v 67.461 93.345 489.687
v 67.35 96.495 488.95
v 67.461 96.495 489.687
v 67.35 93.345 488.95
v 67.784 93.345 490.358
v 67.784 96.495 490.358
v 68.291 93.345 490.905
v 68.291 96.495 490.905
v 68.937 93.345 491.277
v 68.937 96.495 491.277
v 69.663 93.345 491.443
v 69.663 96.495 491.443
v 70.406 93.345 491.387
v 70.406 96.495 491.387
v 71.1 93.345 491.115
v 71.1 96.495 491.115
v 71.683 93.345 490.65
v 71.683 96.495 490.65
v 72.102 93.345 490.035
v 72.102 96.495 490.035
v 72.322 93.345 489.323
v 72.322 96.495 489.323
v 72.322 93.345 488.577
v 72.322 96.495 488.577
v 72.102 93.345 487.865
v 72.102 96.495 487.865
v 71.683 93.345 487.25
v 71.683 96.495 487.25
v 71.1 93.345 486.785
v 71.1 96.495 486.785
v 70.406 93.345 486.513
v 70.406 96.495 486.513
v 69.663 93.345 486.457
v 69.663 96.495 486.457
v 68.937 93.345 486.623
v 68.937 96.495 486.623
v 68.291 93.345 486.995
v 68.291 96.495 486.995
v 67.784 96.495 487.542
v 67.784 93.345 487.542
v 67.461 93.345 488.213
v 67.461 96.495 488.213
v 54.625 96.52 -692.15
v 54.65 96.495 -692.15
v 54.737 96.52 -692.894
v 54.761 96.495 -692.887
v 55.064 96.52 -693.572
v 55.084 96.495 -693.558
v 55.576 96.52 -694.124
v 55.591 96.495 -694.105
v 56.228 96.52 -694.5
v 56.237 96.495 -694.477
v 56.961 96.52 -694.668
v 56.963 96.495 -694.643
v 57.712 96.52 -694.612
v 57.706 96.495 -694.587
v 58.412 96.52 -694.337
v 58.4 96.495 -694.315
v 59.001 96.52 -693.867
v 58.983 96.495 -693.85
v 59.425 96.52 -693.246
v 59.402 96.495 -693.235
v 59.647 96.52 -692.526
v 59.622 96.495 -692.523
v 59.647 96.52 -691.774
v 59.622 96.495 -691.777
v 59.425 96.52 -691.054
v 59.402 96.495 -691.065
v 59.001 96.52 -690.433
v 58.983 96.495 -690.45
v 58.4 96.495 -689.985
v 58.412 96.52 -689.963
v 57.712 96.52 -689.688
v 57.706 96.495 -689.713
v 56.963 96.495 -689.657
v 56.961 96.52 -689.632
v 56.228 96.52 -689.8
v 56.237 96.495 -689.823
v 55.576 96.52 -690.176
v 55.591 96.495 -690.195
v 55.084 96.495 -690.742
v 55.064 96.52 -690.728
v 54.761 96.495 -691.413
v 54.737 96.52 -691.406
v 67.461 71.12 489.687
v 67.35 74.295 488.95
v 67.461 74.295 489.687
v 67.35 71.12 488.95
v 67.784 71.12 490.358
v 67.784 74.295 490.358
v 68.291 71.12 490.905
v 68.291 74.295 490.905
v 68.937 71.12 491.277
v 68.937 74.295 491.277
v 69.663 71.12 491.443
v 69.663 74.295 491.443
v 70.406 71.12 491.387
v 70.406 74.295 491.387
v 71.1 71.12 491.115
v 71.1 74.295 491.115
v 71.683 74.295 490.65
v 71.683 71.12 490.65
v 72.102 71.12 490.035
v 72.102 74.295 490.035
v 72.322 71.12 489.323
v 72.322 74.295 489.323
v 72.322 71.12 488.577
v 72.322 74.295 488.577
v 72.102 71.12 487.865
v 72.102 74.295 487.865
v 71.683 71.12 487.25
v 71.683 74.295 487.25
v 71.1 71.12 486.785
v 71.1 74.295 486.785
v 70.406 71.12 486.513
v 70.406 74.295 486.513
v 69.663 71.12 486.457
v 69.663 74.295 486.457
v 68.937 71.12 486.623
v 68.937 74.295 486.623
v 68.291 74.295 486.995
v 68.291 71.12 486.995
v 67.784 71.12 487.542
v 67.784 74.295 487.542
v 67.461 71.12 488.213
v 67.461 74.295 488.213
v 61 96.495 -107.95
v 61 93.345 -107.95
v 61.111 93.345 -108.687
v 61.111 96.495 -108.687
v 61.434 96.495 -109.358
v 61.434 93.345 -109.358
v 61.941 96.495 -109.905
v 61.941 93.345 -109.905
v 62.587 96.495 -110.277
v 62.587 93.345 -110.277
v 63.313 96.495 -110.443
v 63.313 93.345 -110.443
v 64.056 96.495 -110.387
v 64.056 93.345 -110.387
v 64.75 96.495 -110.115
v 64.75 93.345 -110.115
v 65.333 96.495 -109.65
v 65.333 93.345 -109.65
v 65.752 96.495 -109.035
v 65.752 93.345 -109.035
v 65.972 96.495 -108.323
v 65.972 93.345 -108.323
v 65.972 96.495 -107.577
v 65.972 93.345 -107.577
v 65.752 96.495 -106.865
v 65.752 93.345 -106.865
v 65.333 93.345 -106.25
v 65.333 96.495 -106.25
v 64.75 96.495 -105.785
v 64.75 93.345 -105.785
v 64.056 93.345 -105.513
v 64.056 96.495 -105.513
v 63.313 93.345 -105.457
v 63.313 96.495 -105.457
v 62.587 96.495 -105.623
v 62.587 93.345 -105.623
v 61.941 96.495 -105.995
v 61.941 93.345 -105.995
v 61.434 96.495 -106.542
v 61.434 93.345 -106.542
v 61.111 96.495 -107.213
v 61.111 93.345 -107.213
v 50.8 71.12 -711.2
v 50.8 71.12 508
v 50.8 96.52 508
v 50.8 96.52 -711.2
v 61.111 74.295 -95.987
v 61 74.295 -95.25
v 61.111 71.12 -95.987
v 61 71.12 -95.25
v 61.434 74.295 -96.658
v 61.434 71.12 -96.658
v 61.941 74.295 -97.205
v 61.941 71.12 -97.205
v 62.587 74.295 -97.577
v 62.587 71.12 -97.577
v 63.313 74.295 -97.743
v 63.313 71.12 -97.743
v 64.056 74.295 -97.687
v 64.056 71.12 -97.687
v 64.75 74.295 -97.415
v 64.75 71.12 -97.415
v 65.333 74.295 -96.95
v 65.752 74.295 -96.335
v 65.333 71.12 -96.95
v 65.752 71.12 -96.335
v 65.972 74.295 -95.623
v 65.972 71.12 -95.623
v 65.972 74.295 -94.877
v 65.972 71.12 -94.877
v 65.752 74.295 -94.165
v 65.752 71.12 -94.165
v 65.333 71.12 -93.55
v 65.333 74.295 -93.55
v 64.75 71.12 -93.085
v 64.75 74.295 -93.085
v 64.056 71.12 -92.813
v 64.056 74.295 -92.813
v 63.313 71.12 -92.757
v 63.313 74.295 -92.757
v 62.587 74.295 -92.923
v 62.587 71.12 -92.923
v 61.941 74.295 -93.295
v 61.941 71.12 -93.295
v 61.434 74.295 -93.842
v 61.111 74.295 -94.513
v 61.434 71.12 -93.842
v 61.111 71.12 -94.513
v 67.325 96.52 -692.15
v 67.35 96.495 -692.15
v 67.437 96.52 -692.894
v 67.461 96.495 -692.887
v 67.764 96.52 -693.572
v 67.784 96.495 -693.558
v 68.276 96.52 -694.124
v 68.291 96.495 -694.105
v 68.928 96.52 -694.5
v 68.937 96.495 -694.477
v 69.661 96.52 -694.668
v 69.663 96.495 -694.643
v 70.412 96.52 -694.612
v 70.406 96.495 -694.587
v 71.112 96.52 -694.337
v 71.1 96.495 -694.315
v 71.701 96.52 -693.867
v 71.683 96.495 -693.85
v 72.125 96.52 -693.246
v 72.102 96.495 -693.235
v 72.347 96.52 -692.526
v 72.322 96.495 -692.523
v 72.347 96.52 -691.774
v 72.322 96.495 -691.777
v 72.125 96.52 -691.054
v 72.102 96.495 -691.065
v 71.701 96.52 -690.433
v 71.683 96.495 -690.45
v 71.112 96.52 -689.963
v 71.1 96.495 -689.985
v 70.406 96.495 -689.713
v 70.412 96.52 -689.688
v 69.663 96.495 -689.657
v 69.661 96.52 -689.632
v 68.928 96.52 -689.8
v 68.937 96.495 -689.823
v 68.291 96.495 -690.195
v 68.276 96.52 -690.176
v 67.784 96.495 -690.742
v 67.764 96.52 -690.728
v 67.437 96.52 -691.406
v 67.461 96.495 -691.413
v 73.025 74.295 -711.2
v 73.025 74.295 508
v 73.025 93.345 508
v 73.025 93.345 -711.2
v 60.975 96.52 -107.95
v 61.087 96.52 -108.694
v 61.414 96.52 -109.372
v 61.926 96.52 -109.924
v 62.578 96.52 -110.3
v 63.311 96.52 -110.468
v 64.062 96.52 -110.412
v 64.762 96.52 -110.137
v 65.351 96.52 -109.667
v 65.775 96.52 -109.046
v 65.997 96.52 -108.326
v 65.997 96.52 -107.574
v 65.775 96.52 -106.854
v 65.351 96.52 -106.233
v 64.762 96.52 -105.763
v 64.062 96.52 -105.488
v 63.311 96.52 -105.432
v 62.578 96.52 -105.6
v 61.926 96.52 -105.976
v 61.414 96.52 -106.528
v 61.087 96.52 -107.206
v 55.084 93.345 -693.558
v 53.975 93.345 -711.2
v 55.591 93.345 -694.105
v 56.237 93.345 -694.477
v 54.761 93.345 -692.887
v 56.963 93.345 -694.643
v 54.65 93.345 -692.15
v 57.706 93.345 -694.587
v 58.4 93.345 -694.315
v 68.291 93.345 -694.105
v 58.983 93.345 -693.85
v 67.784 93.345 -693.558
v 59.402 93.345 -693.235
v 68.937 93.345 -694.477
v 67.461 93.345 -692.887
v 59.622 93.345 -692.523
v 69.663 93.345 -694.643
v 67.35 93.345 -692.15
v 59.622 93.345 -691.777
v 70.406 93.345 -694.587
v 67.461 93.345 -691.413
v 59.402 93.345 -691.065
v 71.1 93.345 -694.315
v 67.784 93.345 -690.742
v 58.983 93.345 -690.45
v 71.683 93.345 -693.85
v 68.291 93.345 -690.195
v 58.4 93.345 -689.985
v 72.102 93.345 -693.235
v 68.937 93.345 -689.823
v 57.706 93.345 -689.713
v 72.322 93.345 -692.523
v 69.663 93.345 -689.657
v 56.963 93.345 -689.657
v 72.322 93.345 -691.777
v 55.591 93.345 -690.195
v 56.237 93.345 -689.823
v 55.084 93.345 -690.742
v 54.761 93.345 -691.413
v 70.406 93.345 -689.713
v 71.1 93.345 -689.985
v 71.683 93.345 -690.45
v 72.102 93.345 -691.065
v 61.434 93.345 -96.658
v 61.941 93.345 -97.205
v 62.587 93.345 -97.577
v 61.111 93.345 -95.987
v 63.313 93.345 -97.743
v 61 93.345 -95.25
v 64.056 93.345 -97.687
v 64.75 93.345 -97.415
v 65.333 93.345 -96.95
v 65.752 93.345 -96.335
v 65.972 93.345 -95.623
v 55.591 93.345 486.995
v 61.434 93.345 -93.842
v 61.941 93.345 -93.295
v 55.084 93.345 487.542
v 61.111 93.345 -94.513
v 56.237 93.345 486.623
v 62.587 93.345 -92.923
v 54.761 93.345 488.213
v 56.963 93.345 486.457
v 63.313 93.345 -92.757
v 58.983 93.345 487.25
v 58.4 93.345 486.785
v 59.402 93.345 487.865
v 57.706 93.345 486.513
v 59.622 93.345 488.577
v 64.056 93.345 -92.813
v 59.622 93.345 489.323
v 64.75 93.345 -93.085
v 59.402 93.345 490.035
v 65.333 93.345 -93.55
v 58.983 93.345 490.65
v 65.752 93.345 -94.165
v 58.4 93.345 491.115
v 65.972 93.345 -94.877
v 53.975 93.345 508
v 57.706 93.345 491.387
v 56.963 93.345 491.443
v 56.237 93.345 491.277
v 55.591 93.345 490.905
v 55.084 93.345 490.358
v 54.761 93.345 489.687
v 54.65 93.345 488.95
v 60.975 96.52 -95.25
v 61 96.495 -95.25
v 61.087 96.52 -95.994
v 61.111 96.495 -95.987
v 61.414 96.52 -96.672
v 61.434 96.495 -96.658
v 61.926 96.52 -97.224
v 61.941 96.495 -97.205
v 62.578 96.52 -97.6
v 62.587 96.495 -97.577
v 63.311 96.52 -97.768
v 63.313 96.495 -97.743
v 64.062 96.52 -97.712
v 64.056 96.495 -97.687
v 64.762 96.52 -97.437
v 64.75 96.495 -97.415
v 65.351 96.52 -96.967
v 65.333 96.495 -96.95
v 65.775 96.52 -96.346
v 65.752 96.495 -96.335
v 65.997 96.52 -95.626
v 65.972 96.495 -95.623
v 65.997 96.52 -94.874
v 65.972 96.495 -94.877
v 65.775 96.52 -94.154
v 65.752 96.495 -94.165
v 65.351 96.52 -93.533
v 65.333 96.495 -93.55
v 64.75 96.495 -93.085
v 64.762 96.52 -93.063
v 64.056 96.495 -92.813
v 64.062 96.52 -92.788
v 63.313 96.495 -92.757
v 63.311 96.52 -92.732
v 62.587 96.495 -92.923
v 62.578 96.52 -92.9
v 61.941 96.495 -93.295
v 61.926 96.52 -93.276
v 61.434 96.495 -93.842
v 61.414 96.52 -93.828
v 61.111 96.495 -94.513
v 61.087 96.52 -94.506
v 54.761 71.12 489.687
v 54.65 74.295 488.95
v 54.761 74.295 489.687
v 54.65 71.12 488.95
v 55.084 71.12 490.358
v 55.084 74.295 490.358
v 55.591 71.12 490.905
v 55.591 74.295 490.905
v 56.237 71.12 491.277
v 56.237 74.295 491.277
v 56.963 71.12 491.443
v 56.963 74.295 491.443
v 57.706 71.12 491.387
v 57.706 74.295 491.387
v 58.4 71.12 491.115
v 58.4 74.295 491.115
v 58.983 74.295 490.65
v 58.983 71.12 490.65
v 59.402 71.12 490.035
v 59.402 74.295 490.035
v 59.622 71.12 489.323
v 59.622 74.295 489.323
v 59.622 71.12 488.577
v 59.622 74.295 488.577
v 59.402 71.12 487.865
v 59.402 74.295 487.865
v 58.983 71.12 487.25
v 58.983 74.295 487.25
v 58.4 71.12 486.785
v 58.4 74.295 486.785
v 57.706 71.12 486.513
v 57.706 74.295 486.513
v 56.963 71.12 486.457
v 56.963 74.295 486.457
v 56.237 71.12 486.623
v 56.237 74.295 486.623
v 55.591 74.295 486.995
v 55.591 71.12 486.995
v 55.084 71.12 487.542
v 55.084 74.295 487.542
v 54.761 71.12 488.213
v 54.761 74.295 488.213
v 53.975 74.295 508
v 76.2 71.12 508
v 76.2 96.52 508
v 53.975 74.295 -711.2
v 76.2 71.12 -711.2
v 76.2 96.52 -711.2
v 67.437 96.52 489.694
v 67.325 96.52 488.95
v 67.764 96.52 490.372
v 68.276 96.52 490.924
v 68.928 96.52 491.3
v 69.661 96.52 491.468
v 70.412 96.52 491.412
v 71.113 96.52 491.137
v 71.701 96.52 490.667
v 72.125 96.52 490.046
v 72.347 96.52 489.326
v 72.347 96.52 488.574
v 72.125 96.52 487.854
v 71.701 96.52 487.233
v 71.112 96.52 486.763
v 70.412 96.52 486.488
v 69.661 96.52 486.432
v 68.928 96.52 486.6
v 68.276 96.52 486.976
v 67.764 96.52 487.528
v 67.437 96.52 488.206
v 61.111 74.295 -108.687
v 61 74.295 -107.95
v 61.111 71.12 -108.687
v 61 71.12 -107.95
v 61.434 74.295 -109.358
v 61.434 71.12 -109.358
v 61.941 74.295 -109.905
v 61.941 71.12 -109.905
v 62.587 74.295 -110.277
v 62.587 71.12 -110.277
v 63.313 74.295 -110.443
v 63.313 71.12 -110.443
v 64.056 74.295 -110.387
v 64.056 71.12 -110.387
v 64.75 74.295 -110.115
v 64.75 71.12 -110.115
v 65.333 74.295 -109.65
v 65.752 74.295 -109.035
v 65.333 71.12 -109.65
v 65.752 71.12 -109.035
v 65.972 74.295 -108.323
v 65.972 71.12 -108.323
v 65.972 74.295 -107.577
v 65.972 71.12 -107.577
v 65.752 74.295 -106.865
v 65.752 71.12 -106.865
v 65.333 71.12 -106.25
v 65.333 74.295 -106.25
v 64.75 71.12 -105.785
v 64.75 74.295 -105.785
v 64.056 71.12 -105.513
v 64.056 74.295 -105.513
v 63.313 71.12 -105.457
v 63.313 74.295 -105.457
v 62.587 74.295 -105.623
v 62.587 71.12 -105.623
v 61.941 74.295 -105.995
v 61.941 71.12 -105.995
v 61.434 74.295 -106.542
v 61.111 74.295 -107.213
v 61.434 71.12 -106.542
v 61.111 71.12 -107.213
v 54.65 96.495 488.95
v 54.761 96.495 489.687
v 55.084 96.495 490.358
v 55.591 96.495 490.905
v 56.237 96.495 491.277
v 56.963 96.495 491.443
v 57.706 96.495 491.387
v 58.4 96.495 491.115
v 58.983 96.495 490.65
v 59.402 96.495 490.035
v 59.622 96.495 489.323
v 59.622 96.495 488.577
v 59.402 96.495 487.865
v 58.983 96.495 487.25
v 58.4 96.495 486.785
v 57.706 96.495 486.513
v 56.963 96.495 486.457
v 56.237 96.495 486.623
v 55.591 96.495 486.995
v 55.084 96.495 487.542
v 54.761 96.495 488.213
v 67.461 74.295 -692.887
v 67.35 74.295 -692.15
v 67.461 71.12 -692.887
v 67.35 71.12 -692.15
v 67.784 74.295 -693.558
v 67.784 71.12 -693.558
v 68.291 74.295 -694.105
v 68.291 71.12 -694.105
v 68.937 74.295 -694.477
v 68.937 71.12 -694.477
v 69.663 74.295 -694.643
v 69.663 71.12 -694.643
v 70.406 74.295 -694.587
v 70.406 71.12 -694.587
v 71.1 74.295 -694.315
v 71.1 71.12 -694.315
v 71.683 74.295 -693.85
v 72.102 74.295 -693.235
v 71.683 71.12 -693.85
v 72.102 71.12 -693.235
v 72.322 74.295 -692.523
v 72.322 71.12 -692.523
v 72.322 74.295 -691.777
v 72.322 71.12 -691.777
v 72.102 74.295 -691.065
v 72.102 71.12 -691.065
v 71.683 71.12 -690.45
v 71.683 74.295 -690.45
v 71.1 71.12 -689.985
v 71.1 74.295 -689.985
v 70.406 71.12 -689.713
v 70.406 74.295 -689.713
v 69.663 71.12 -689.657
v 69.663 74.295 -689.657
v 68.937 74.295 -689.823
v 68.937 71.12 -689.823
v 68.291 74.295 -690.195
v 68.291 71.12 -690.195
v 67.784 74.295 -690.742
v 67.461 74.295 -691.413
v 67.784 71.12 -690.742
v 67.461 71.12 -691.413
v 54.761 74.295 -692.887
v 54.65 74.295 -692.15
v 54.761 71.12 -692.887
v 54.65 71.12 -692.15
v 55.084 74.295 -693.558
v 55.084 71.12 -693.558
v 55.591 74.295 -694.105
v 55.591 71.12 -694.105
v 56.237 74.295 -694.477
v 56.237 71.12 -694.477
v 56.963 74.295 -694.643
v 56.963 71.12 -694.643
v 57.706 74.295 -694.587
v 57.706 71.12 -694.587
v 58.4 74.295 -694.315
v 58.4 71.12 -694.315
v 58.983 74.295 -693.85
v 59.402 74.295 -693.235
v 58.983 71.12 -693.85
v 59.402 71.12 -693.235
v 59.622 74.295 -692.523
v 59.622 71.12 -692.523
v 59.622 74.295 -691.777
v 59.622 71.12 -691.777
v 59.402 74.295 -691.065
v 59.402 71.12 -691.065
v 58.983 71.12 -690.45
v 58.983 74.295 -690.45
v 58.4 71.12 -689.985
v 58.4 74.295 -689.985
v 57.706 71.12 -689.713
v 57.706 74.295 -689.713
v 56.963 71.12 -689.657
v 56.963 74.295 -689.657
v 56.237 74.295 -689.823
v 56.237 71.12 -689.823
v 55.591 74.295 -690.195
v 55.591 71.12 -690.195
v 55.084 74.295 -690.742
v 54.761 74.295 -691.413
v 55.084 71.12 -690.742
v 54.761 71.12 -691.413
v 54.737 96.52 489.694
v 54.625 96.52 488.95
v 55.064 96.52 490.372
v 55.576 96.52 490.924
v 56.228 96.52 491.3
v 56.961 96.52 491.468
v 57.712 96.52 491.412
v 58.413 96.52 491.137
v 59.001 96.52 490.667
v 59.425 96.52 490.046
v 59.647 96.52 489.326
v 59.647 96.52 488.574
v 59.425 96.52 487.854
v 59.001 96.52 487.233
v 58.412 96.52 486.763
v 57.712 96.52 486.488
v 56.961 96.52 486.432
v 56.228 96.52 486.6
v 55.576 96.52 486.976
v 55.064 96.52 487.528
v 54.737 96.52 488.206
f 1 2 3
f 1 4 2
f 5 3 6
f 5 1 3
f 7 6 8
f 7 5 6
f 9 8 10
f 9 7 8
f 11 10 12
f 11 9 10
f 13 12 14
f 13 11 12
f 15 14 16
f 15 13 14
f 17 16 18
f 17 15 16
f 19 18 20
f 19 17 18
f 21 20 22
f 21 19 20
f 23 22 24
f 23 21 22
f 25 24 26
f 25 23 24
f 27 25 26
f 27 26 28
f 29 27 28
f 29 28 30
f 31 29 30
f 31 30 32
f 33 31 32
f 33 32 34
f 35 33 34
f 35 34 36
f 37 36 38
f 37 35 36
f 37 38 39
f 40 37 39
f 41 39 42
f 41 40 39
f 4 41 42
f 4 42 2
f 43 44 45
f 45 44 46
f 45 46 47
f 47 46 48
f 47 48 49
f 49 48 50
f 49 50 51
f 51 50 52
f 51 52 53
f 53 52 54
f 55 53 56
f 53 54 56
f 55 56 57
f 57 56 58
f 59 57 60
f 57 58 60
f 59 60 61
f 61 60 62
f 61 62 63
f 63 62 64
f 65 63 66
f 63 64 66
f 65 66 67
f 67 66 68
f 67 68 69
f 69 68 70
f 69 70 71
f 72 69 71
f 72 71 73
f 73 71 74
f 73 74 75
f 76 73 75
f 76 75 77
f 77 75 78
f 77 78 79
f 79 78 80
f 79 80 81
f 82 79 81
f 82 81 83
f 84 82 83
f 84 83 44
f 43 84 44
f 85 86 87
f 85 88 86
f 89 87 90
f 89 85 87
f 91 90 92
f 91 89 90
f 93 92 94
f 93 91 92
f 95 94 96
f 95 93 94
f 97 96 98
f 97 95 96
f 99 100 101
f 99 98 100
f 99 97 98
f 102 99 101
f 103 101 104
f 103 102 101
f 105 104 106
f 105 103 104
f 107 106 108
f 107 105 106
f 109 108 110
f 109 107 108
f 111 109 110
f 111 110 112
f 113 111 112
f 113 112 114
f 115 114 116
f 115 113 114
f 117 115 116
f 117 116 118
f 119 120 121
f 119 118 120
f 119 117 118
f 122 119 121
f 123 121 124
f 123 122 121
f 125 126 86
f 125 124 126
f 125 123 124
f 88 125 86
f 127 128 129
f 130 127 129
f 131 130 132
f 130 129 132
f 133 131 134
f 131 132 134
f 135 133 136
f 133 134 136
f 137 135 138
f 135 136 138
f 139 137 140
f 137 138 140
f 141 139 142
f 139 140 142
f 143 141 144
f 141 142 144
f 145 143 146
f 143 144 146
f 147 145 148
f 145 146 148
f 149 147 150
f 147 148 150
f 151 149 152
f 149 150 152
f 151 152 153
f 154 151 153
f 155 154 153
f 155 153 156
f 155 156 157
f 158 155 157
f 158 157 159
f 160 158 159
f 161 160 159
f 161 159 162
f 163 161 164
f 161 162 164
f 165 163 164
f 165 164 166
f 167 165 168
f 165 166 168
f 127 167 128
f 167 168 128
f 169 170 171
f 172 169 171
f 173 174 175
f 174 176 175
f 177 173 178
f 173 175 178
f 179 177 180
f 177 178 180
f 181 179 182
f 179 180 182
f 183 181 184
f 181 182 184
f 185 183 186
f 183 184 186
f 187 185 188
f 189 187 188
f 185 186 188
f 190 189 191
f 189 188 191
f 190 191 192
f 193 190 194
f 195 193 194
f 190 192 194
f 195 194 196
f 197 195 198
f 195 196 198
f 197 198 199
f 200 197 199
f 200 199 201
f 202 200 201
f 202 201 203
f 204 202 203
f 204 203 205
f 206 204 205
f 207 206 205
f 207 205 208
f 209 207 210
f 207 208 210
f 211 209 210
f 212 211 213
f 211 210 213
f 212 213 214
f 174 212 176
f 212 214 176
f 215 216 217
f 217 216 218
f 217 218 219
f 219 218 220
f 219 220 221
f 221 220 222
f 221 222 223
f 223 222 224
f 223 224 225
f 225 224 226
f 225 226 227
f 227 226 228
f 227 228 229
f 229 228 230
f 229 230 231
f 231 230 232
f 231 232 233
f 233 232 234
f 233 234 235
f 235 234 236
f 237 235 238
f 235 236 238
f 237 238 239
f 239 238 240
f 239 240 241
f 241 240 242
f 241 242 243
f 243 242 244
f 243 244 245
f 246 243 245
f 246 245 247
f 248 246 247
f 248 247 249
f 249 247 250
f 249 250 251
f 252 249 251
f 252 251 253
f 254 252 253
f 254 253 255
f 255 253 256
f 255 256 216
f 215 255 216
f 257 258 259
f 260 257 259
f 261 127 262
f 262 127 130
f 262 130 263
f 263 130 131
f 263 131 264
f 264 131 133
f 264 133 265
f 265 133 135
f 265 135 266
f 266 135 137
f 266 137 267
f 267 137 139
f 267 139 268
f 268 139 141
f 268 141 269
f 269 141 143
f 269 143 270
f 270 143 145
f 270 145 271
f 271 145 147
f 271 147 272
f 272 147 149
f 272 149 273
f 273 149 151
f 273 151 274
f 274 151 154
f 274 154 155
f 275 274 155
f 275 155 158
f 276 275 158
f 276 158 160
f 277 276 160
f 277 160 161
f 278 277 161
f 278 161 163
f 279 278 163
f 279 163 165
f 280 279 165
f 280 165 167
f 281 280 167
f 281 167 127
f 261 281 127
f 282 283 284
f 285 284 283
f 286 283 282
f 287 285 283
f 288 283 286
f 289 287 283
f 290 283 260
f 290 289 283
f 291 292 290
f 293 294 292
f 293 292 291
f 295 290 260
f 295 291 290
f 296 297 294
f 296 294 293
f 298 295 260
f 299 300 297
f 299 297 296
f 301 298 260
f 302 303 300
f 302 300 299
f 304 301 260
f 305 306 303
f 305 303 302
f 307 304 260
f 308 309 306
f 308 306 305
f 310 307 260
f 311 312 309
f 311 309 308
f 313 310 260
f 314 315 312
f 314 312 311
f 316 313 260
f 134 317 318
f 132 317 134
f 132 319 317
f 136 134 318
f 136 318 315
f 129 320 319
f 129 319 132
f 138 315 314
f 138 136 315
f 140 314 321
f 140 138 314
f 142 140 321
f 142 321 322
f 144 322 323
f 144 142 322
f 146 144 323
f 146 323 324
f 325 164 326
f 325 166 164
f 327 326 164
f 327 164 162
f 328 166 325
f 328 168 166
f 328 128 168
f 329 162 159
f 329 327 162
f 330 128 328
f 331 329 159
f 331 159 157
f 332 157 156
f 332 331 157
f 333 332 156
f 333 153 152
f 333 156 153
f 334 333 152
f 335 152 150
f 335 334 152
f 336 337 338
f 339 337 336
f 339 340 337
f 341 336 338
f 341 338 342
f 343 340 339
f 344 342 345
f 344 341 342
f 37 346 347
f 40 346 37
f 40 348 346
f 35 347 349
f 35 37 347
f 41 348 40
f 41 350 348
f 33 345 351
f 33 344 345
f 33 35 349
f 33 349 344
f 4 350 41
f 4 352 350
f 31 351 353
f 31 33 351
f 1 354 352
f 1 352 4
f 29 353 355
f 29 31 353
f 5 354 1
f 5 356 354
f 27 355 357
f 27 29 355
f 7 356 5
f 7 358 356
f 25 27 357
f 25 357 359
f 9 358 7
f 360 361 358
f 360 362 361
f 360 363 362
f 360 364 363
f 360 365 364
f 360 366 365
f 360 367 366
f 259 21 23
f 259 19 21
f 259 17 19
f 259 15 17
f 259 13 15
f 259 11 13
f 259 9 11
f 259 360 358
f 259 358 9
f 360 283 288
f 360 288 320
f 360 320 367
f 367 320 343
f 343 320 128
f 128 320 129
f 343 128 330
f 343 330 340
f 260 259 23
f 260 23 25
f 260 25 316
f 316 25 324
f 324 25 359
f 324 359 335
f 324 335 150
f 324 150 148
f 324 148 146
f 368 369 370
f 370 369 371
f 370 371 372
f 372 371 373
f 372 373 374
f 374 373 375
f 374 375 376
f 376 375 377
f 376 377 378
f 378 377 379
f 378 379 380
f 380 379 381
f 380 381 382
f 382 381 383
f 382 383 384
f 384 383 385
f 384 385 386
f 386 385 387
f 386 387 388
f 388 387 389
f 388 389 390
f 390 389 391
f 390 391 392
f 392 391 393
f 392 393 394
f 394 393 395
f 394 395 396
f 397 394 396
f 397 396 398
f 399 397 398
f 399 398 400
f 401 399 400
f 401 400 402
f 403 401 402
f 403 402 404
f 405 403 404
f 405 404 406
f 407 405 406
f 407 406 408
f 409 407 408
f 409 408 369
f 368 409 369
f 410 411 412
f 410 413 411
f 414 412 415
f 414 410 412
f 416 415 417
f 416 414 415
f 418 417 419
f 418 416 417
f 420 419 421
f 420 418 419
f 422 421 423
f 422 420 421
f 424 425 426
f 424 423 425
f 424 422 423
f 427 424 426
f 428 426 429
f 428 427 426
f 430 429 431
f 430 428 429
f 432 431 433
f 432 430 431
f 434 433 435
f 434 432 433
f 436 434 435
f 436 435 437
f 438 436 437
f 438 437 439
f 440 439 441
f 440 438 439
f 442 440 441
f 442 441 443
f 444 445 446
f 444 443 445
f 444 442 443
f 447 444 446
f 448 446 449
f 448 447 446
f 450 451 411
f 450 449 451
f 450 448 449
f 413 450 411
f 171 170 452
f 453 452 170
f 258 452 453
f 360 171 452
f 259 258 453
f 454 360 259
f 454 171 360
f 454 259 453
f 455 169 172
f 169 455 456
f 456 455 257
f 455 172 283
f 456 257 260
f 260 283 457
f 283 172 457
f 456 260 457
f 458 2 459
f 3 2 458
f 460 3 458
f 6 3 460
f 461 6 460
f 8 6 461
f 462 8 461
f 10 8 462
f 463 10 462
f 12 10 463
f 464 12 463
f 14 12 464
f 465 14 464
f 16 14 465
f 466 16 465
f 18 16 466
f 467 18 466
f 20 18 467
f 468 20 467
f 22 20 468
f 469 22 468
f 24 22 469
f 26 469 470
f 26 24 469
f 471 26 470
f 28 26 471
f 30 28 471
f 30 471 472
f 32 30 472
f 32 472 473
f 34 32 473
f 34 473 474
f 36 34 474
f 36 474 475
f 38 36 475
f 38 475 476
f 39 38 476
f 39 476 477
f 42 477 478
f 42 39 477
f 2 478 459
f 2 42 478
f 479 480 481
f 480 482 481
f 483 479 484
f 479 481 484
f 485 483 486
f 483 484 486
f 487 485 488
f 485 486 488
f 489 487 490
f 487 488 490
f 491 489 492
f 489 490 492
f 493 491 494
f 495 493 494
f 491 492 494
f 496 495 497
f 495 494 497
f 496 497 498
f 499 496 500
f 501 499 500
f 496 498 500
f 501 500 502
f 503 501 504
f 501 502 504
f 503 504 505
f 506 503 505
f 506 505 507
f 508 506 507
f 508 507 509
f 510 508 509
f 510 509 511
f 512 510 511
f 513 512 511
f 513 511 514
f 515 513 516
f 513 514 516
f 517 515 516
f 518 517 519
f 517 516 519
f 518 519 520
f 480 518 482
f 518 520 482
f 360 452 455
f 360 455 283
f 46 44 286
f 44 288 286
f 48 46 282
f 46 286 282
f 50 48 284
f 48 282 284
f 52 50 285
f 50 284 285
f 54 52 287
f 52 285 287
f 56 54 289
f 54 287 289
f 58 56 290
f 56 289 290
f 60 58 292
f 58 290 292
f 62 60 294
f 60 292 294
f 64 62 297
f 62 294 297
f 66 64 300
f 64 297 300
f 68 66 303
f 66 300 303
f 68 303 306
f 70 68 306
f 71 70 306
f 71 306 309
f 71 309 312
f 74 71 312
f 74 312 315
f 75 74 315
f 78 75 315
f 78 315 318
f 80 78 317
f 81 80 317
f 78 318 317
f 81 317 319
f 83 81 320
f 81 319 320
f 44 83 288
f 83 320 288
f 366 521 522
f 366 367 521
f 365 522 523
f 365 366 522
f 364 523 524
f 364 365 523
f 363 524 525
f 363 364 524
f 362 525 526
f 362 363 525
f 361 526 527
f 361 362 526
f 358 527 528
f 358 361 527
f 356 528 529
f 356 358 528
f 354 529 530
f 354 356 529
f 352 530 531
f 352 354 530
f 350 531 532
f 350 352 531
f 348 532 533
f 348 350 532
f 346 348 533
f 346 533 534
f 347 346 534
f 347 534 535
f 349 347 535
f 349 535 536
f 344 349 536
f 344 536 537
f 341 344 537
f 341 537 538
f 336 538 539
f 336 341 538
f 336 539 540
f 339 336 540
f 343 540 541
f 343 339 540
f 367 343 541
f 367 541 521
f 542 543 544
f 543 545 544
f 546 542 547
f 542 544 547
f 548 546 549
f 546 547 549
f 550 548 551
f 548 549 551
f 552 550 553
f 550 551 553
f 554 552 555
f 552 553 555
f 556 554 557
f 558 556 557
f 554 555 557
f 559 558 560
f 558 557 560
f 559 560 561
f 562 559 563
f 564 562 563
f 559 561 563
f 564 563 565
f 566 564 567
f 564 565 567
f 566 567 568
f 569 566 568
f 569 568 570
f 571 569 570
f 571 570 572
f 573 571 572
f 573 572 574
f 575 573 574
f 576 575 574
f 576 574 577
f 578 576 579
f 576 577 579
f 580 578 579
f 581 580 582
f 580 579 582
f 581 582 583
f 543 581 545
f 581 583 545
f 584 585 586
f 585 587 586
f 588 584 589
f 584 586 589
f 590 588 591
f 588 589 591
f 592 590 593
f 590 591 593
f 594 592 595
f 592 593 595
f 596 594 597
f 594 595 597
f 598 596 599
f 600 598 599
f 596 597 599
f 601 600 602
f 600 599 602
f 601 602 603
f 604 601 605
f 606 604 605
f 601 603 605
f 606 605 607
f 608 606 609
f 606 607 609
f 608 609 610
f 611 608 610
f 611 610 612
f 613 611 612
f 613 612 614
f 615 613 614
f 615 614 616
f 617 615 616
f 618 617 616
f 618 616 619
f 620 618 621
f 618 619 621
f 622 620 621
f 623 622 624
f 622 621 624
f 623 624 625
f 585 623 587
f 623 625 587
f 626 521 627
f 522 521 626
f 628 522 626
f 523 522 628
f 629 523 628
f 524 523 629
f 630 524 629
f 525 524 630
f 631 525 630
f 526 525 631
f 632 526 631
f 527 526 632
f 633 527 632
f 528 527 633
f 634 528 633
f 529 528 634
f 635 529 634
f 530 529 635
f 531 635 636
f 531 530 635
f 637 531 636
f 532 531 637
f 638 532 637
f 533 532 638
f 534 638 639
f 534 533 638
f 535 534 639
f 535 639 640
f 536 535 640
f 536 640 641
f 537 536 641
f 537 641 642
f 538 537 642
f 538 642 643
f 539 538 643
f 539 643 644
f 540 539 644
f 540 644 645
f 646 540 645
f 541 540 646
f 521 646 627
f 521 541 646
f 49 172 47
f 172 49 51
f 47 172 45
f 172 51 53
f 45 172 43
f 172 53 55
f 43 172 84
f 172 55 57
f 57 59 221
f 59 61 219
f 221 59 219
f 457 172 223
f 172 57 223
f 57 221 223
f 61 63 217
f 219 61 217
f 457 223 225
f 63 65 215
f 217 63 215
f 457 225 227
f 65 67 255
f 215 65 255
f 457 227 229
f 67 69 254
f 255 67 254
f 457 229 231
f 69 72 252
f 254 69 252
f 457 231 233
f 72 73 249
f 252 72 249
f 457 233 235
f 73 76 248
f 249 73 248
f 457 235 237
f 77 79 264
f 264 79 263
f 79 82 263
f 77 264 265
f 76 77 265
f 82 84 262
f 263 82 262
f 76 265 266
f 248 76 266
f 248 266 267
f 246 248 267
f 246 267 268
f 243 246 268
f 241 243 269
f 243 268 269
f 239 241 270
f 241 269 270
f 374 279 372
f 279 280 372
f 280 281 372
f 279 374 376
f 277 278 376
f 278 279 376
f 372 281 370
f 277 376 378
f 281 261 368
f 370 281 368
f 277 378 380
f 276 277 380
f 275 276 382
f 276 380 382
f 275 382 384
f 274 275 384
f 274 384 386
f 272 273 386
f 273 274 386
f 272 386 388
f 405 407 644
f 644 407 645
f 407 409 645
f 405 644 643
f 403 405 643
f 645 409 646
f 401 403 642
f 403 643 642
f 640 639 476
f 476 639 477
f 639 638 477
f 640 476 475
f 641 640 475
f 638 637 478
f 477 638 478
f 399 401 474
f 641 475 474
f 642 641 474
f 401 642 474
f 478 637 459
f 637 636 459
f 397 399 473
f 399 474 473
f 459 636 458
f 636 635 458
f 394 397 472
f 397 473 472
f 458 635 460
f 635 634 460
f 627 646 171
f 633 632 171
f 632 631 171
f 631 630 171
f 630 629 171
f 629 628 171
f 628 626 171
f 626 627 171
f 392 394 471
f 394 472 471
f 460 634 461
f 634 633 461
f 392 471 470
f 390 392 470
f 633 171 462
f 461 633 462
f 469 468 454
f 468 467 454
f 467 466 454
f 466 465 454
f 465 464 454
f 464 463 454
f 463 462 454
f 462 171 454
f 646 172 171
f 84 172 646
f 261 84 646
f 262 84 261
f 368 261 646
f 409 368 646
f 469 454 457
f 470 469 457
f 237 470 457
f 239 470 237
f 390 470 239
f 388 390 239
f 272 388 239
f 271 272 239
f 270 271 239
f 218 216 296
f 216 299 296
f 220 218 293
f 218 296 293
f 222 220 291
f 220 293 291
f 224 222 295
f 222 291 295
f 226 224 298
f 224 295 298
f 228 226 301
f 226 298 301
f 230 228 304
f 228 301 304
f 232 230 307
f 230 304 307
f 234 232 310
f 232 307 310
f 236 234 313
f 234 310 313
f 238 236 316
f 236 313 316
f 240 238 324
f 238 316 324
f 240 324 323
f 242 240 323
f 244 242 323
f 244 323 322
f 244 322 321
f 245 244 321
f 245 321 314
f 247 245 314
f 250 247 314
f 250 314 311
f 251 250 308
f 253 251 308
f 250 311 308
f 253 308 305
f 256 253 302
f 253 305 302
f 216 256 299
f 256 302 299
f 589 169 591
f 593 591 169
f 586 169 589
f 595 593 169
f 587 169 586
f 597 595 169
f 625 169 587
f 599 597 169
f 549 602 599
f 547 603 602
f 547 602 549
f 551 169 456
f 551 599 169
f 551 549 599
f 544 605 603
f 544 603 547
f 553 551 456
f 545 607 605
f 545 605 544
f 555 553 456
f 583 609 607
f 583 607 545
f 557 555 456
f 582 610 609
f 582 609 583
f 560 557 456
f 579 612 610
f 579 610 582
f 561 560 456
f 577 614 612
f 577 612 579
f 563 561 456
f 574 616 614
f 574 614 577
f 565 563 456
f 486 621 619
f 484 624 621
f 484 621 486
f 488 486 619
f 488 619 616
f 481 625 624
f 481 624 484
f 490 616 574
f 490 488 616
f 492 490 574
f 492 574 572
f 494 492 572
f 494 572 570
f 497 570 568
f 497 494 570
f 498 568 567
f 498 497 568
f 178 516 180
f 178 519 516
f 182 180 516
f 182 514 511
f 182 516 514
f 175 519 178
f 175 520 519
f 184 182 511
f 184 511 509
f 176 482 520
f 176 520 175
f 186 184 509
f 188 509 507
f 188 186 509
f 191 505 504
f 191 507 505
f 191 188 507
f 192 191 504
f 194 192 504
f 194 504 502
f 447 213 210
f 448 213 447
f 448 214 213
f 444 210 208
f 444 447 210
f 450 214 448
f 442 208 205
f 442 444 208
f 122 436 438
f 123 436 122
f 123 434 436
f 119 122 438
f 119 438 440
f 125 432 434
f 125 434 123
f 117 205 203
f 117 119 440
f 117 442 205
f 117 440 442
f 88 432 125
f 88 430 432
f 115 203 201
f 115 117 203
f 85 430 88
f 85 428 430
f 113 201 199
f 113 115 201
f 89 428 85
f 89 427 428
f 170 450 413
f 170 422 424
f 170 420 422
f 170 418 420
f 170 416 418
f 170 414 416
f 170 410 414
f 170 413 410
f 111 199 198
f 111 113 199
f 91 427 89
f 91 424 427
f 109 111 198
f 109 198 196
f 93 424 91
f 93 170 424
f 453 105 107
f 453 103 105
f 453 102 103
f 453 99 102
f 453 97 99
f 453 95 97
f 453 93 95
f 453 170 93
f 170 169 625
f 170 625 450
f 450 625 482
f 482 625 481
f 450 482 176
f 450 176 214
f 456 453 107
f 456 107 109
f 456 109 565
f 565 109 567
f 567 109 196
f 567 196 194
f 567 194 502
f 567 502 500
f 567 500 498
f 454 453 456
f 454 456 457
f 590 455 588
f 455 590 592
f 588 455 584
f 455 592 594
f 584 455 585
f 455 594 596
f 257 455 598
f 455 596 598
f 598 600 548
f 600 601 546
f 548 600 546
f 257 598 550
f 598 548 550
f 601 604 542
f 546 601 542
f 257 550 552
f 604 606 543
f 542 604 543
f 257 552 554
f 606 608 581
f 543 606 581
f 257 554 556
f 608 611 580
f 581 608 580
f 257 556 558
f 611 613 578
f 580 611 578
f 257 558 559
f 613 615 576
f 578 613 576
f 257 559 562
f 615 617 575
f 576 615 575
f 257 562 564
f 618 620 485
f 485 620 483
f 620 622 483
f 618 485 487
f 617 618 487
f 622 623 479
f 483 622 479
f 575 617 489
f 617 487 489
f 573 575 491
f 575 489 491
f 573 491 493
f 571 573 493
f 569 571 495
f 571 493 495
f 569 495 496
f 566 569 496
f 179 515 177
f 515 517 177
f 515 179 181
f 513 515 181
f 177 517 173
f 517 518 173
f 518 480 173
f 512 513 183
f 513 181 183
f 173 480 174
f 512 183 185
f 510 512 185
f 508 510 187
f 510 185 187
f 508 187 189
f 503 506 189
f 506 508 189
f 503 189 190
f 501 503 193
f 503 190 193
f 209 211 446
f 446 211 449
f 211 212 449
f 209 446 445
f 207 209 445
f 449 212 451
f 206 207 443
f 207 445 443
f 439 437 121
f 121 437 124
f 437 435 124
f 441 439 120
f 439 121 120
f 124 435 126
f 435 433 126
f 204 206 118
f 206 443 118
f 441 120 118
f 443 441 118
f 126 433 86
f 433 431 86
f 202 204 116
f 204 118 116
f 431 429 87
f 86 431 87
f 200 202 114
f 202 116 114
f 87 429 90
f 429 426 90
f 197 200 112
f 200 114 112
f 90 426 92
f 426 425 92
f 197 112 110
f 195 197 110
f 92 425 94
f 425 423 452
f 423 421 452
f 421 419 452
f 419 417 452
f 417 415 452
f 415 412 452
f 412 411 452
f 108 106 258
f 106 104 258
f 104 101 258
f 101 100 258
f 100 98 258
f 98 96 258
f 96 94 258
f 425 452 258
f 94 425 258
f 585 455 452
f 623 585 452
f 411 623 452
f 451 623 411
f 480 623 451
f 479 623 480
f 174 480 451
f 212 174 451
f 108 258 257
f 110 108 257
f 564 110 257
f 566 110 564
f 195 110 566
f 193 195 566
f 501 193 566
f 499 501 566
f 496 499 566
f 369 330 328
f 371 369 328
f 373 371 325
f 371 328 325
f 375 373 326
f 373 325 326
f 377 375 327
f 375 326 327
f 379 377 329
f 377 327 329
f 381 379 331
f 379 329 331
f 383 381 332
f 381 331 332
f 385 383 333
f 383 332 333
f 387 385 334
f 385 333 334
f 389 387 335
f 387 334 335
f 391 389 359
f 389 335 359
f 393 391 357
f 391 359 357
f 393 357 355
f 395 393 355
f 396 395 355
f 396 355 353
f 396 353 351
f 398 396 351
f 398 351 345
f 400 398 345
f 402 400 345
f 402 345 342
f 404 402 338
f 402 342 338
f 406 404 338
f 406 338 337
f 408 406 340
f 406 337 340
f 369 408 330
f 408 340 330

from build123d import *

# Parameters (mm, degrees)
EXTRUDE_THIN1_START             = 508
SKETCH5_W                       = 25.4
SKETCH5_H                       = 25.4
SKETCH5_W_2                     = 19.05
SKETCH5_H_2                     = 19.05
EXTRUDE_THIN1_DEPTH             = 1219.2
F_5_0MM_DOWEL_HOLE1_D           = 5
F_5_0MM_DOWEL_HOLE1_CSINK_D     = 5.05
F_5_0MM_DOWEL_HOLE1_CSINK_ANGLE = 90


with BuildPart() as part:
    # Sketch5 → Extrude-Thin1 (new body)
    with BuildSketch(Plane.XY.offset(EXTRUDE_THIN1_START)):
        with Locations((63.5, 83.82)):
            Rectangle(SKETCH5_W, SKETCH5_H)
        with Locations((63.5, 83.82)):
            Rectangle(SKETCH5_W_2, SKETCH5_H_2, mode=Mode.SUBTRACT)
    extrude(amount=-EXTRUDE_THIN1_DEPTH)

    # Ø5.0mm Dowel Hole1 (through all)
    with Locations(Plane(origin=(0, 96.52, 0), x_dir=(1, 0, 0), z_dir=(0, 1, 0))):
        with Locations((63.5, 107.95), (63.5, 95.25), (57.15, 692.15), (69.85, 692.15)):
            f_5_0mm_dowel_hole1 = CounterSinkHole(F_5_0MM_DOWEL_HOLE1_D / 2, F_5_0MM_DOWEL_HOLE1_CSINK_D / 2, counter_sink_angle=F_5_0MM_DOWEL_HOLE1_CSINK_ANGLE)

    # Mirror1: Ø5.0mm Dowel Hole1 across plane
    add(f_5_0mm_dowel_hole1.mirror(Plane.XY.offset(-101.6)), mode=Mode.SUBTRACT)


solid = part.part
